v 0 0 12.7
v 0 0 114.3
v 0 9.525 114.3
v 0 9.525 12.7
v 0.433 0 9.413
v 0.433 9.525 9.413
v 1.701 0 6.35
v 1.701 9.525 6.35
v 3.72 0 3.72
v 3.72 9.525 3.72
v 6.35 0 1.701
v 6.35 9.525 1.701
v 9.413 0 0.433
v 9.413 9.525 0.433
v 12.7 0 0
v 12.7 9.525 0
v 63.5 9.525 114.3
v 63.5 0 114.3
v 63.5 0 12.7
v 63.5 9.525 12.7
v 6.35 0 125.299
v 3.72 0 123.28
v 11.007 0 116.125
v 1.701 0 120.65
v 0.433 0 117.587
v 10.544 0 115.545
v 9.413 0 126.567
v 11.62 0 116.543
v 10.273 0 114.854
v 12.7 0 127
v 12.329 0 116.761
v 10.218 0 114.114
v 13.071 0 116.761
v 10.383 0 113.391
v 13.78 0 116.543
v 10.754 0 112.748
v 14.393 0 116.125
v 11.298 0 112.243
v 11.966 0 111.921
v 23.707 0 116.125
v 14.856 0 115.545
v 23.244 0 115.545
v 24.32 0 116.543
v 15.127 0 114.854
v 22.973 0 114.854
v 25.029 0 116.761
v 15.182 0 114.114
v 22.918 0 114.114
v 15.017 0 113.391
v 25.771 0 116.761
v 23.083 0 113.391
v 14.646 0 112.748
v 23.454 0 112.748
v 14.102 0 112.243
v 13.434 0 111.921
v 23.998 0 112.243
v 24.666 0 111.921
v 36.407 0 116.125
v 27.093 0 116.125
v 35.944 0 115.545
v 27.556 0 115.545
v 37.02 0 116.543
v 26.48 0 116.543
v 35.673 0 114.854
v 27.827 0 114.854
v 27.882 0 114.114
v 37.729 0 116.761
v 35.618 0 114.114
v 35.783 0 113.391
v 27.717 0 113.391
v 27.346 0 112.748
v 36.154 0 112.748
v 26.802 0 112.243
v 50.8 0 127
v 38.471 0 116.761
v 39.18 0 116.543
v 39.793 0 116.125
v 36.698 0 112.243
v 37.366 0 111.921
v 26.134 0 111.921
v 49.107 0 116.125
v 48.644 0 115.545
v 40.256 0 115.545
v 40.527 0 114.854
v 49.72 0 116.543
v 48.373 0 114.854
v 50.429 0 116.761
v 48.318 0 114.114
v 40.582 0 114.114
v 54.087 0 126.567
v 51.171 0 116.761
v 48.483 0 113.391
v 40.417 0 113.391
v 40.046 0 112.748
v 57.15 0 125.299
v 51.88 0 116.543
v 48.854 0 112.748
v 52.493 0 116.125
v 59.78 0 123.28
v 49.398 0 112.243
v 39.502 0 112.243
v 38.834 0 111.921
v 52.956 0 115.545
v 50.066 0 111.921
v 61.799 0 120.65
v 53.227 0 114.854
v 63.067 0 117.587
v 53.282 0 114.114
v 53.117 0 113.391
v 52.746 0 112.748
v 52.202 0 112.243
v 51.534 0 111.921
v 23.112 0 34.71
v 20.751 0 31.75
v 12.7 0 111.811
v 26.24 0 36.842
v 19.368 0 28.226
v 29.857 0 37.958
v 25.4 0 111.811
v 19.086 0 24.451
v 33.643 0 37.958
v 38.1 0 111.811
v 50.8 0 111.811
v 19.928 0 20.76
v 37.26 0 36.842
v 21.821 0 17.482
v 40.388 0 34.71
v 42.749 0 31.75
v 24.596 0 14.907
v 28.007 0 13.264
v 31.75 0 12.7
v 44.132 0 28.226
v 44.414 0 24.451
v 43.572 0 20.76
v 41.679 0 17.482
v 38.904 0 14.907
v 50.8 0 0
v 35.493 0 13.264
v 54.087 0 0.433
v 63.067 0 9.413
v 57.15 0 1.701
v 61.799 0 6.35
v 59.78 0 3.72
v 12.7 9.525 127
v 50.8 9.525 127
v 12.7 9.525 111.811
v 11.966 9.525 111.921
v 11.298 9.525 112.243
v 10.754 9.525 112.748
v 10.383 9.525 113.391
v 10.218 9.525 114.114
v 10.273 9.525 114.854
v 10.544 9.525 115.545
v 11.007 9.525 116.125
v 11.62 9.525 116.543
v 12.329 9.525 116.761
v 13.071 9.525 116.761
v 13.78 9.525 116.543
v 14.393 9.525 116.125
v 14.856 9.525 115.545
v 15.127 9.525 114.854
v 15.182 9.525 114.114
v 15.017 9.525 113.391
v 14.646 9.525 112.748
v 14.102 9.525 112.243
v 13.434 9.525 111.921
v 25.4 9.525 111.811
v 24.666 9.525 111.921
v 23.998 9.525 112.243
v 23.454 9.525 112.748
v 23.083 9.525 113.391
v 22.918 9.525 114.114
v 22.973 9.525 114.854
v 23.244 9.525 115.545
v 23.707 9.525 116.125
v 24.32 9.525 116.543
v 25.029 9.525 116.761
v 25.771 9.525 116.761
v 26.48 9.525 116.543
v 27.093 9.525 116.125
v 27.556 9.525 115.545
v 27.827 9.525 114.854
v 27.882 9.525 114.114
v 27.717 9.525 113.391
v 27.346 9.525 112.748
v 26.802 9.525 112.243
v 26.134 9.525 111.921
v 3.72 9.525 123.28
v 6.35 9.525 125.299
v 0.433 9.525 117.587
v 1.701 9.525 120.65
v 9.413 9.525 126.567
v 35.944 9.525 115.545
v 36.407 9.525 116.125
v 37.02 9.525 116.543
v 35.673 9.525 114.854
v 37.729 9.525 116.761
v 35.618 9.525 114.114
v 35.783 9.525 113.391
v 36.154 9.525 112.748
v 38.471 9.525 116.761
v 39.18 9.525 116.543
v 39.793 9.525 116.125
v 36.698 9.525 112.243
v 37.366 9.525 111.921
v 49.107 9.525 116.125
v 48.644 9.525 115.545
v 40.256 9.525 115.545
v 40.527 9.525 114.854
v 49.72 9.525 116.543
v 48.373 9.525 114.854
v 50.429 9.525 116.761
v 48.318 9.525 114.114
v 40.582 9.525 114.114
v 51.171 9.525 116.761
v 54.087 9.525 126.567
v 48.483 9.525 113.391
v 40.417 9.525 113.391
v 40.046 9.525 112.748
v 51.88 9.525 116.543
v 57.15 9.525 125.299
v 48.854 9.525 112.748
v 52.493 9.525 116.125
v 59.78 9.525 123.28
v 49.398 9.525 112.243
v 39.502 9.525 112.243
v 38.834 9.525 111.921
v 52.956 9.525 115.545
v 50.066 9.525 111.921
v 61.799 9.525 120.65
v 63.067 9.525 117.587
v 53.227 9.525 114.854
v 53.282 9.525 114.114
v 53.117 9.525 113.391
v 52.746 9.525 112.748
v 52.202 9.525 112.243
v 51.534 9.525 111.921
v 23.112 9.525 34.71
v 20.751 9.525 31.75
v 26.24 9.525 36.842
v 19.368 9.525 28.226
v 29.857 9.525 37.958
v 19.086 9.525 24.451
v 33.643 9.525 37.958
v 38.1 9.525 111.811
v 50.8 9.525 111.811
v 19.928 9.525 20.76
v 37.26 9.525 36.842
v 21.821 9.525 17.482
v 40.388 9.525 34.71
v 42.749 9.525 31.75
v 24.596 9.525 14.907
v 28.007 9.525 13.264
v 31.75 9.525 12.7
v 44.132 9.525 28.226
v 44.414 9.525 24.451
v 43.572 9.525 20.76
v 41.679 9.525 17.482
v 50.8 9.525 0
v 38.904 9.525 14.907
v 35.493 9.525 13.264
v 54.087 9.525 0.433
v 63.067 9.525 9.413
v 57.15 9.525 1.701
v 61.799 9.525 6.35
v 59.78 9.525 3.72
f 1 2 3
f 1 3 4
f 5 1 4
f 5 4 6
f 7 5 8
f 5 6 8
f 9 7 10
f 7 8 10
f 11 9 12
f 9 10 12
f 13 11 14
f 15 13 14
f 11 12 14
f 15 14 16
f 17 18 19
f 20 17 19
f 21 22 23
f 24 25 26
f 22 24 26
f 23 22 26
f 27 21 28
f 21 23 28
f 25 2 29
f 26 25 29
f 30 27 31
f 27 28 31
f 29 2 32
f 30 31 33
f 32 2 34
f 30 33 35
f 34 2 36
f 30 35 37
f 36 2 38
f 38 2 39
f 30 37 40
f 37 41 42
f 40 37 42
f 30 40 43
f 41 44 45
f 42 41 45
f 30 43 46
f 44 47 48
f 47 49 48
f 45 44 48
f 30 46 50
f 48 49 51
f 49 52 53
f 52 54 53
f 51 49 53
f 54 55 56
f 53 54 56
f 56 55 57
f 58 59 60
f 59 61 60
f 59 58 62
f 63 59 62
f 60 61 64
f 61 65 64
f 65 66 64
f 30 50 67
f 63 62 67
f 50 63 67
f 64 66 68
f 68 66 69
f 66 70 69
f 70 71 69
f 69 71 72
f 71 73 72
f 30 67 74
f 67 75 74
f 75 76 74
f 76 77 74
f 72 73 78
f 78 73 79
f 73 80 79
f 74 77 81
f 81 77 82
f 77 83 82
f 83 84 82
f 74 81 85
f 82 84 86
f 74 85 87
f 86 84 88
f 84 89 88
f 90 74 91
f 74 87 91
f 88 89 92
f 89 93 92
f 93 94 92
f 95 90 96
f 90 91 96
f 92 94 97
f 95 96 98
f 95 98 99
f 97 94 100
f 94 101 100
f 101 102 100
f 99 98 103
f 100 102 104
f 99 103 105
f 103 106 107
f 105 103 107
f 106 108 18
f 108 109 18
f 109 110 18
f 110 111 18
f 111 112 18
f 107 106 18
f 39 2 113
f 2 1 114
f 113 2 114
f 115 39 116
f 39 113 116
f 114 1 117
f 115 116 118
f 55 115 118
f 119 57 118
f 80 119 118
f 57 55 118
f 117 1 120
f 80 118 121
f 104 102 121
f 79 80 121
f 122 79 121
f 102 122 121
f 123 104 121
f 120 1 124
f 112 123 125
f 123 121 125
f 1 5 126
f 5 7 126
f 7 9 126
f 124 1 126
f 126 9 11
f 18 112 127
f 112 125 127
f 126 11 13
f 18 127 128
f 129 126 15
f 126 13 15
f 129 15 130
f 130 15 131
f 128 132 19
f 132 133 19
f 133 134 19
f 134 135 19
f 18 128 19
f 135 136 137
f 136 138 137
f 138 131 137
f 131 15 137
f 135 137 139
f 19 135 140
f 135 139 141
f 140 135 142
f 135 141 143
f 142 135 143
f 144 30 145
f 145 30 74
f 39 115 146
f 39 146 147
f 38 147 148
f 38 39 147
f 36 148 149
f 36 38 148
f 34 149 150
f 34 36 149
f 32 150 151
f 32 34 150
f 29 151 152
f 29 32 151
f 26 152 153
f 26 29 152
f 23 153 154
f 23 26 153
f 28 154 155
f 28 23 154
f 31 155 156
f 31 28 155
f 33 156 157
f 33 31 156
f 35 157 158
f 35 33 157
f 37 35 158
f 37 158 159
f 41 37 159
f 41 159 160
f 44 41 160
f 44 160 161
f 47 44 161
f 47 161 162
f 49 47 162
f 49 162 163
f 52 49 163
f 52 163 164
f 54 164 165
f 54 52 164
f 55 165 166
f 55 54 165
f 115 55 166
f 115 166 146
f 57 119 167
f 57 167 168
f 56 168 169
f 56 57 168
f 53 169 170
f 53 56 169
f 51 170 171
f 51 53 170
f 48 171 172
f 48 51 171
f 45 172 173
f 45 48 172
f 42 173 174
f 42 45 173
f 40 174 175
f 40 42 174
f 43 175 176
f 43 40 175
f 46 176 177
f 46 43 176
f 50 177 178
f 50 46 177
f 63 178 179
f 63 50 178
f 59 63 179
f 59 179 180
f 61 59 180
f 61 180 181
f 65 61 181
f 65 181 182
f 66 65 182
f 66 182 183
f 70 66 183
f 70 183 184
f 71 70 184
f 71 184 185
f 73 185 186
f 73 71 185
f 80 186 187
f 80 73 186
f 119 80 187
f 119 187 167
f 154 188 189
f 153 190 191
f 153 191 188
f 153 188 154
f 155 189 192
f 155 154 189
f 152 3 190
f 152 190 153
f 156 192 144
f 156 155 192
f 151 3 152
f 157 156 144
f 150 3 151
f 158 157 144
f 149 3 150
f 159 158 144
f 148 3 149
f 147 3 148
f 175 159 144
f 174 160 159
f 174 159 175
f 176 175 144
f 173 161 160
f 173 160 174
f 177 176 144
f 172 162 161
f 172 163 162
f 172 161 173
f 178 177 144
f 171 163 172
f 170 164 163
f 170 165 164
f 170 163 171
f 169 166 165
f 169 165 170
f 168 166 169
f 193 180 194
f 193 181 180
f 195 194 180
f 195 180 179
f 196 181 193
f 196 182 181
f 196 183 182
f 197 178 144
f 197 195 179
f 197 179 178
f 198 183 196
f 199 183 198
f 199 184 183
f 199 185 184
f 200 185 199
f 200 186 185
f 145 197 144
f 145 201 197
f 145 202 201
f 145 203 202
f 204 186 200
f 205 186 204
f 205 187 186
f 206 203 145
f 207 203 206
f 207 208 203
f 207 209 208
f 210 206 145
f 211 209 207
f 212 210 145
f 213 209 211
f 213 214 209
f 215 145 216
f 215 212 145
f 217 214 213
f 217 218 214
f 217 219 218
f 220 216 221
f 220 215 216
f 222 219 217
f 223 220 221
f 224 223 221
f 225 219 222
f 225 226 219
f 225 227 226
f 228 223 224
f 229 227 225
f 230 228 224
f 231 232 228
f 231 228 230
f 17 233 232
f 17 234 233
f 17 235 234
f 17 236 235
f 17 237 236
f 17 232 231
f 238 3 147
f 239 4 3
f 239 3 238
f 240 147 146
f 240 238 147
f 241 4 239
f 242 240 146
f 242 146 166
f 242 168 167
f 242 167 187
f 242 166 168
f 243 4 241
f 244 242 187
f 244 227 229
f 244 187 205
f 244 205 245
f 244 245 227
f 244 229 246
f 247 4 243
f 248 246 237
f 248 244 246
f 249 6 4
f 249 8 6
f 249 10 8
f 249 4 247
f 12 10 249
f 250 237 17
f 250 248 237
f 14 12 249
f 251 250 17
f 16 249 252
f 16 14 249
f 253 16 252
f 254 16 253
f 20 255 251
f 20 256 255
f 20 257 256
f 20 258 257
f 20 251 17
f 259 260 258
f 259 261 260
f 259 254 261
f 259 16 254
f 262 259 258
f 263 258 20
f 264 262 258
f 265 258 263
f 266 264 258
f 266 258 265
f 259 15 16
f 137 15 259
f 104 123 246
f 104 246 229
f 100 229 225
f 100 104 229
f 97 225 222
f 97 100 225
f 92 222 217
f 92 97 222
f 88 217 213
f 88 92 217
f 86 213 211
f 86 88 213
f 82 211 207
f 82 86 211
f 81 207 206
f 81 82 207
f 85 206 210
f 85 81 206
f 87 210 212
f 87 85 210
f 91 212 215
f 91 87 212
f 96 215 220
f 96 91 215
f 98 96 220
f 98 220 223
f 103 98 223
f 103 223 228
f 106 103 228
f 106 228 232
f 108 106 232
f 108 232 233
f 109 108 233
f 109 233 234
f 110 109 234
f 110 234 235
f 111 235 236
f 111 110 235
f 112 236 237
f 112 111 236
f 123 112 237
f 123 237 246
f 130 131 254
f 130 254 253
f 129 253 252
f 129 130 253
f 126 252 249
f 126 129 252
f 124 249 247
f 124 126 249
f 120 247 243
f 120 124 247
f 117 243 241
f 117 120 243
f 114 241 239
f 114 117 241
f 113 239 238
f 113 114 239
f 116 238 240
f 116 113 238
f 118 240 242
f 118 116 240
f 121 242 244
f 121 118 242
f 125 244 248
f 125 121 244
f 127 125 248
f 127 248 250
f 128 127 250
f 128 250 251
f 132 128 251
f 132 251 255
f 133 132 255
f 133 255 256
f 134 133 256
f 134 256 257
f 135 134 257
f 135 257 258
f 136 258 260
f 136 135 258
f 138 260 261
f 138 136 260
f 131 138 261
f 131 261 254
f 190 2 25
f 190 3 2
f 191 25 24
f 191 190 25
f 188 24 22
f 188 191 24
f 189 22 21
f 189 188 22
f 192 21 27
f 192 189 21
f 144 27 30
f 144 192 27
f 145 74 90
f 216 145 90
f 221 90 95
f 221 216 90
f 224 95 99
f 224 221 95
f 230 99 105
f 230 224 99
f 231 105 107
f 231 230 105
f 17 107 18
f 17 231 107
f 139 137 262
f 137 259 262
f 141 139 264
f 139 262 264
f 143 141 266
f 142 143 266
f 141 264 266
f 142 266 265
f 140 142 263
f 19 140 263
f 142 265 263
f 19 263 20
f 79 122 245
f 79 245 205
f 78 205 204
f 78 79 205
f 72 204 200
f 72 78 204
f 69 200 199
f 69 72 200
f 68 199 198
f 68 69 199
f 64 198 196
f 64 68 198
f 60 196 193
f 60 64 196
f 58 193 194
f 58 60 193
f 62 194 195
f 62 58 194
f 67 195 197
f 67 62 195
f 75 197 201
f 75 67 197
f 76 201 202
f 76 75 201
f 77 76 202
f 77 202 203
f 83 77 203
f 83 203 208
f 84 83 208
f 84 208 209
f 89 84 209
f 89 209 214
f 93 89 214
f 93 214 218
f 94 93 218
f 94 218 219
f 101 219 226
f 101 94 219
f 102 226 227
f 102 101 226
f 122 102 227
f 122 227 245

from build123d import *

# Parameters (mm, degrees)
SKETCH1_W           = 63.5
SKETCH1_H           = 127
SKETCH1_R           = 12.7
SKETCH1_R_2         = 2.4892
BOSS_EXTRUDE1_DEPTH = 9.525
FILLET1_R           = 12.7


with BuildPart() as part:
    # Sketch1 → Boss-Extrude1 (new body)
    with BuildSketch(Plane(origin=(0, 0, 0), x_dir=(1, 0, 0), z_dir=(0, 1, 0))):
        with Locations((31.75, -63.5)):
            Rectangle(SKETCH1_W, SKETCH1_H)
        with Locations(Location((31.75, -25.4, 0), (0, 0, 90))):
            Circle(SKETCH1_R, mode=Mode.SUBTRACT)
        with Locations(Location((12.7, -114.3, 0), (0, 0, 90))):
            Circle(SKETCH1_R_2, mode=Mode.SUBTRACT)
        with Locations(Location((25.4, -114.3, 0), (0, 0, 90))):
            Circle(SKETCH1_R_2, mode=Mode.SUBTRACT)
        with Locations(Location((38.1, -114.3, 0), (0, 0, 90))):
            Circle(SKETCH1_R_2, mode=Mode.SUBTRACT)
        with Locations(Location((50.8, -114.3, 0), (0, 0, 90))):
            Circle(SKETCH1_R_2, mode=Mode.SUBTRACT)
    extrude(amount=BOSS_EXTRUDE1_DEPTH)

    # Fillet1
    fillet1_edges = [part.edges().sort_by_distance(p)[0] for p in [
        (0, 4.7625, 0),
        (63.5, 4.7625, 0),
        (63.5, 4.7625, 127),
        (0, 4.7625, 127),
    ]]
    fillet(fillet1_edges, radius=FILLET1_R)


solid = part.part
